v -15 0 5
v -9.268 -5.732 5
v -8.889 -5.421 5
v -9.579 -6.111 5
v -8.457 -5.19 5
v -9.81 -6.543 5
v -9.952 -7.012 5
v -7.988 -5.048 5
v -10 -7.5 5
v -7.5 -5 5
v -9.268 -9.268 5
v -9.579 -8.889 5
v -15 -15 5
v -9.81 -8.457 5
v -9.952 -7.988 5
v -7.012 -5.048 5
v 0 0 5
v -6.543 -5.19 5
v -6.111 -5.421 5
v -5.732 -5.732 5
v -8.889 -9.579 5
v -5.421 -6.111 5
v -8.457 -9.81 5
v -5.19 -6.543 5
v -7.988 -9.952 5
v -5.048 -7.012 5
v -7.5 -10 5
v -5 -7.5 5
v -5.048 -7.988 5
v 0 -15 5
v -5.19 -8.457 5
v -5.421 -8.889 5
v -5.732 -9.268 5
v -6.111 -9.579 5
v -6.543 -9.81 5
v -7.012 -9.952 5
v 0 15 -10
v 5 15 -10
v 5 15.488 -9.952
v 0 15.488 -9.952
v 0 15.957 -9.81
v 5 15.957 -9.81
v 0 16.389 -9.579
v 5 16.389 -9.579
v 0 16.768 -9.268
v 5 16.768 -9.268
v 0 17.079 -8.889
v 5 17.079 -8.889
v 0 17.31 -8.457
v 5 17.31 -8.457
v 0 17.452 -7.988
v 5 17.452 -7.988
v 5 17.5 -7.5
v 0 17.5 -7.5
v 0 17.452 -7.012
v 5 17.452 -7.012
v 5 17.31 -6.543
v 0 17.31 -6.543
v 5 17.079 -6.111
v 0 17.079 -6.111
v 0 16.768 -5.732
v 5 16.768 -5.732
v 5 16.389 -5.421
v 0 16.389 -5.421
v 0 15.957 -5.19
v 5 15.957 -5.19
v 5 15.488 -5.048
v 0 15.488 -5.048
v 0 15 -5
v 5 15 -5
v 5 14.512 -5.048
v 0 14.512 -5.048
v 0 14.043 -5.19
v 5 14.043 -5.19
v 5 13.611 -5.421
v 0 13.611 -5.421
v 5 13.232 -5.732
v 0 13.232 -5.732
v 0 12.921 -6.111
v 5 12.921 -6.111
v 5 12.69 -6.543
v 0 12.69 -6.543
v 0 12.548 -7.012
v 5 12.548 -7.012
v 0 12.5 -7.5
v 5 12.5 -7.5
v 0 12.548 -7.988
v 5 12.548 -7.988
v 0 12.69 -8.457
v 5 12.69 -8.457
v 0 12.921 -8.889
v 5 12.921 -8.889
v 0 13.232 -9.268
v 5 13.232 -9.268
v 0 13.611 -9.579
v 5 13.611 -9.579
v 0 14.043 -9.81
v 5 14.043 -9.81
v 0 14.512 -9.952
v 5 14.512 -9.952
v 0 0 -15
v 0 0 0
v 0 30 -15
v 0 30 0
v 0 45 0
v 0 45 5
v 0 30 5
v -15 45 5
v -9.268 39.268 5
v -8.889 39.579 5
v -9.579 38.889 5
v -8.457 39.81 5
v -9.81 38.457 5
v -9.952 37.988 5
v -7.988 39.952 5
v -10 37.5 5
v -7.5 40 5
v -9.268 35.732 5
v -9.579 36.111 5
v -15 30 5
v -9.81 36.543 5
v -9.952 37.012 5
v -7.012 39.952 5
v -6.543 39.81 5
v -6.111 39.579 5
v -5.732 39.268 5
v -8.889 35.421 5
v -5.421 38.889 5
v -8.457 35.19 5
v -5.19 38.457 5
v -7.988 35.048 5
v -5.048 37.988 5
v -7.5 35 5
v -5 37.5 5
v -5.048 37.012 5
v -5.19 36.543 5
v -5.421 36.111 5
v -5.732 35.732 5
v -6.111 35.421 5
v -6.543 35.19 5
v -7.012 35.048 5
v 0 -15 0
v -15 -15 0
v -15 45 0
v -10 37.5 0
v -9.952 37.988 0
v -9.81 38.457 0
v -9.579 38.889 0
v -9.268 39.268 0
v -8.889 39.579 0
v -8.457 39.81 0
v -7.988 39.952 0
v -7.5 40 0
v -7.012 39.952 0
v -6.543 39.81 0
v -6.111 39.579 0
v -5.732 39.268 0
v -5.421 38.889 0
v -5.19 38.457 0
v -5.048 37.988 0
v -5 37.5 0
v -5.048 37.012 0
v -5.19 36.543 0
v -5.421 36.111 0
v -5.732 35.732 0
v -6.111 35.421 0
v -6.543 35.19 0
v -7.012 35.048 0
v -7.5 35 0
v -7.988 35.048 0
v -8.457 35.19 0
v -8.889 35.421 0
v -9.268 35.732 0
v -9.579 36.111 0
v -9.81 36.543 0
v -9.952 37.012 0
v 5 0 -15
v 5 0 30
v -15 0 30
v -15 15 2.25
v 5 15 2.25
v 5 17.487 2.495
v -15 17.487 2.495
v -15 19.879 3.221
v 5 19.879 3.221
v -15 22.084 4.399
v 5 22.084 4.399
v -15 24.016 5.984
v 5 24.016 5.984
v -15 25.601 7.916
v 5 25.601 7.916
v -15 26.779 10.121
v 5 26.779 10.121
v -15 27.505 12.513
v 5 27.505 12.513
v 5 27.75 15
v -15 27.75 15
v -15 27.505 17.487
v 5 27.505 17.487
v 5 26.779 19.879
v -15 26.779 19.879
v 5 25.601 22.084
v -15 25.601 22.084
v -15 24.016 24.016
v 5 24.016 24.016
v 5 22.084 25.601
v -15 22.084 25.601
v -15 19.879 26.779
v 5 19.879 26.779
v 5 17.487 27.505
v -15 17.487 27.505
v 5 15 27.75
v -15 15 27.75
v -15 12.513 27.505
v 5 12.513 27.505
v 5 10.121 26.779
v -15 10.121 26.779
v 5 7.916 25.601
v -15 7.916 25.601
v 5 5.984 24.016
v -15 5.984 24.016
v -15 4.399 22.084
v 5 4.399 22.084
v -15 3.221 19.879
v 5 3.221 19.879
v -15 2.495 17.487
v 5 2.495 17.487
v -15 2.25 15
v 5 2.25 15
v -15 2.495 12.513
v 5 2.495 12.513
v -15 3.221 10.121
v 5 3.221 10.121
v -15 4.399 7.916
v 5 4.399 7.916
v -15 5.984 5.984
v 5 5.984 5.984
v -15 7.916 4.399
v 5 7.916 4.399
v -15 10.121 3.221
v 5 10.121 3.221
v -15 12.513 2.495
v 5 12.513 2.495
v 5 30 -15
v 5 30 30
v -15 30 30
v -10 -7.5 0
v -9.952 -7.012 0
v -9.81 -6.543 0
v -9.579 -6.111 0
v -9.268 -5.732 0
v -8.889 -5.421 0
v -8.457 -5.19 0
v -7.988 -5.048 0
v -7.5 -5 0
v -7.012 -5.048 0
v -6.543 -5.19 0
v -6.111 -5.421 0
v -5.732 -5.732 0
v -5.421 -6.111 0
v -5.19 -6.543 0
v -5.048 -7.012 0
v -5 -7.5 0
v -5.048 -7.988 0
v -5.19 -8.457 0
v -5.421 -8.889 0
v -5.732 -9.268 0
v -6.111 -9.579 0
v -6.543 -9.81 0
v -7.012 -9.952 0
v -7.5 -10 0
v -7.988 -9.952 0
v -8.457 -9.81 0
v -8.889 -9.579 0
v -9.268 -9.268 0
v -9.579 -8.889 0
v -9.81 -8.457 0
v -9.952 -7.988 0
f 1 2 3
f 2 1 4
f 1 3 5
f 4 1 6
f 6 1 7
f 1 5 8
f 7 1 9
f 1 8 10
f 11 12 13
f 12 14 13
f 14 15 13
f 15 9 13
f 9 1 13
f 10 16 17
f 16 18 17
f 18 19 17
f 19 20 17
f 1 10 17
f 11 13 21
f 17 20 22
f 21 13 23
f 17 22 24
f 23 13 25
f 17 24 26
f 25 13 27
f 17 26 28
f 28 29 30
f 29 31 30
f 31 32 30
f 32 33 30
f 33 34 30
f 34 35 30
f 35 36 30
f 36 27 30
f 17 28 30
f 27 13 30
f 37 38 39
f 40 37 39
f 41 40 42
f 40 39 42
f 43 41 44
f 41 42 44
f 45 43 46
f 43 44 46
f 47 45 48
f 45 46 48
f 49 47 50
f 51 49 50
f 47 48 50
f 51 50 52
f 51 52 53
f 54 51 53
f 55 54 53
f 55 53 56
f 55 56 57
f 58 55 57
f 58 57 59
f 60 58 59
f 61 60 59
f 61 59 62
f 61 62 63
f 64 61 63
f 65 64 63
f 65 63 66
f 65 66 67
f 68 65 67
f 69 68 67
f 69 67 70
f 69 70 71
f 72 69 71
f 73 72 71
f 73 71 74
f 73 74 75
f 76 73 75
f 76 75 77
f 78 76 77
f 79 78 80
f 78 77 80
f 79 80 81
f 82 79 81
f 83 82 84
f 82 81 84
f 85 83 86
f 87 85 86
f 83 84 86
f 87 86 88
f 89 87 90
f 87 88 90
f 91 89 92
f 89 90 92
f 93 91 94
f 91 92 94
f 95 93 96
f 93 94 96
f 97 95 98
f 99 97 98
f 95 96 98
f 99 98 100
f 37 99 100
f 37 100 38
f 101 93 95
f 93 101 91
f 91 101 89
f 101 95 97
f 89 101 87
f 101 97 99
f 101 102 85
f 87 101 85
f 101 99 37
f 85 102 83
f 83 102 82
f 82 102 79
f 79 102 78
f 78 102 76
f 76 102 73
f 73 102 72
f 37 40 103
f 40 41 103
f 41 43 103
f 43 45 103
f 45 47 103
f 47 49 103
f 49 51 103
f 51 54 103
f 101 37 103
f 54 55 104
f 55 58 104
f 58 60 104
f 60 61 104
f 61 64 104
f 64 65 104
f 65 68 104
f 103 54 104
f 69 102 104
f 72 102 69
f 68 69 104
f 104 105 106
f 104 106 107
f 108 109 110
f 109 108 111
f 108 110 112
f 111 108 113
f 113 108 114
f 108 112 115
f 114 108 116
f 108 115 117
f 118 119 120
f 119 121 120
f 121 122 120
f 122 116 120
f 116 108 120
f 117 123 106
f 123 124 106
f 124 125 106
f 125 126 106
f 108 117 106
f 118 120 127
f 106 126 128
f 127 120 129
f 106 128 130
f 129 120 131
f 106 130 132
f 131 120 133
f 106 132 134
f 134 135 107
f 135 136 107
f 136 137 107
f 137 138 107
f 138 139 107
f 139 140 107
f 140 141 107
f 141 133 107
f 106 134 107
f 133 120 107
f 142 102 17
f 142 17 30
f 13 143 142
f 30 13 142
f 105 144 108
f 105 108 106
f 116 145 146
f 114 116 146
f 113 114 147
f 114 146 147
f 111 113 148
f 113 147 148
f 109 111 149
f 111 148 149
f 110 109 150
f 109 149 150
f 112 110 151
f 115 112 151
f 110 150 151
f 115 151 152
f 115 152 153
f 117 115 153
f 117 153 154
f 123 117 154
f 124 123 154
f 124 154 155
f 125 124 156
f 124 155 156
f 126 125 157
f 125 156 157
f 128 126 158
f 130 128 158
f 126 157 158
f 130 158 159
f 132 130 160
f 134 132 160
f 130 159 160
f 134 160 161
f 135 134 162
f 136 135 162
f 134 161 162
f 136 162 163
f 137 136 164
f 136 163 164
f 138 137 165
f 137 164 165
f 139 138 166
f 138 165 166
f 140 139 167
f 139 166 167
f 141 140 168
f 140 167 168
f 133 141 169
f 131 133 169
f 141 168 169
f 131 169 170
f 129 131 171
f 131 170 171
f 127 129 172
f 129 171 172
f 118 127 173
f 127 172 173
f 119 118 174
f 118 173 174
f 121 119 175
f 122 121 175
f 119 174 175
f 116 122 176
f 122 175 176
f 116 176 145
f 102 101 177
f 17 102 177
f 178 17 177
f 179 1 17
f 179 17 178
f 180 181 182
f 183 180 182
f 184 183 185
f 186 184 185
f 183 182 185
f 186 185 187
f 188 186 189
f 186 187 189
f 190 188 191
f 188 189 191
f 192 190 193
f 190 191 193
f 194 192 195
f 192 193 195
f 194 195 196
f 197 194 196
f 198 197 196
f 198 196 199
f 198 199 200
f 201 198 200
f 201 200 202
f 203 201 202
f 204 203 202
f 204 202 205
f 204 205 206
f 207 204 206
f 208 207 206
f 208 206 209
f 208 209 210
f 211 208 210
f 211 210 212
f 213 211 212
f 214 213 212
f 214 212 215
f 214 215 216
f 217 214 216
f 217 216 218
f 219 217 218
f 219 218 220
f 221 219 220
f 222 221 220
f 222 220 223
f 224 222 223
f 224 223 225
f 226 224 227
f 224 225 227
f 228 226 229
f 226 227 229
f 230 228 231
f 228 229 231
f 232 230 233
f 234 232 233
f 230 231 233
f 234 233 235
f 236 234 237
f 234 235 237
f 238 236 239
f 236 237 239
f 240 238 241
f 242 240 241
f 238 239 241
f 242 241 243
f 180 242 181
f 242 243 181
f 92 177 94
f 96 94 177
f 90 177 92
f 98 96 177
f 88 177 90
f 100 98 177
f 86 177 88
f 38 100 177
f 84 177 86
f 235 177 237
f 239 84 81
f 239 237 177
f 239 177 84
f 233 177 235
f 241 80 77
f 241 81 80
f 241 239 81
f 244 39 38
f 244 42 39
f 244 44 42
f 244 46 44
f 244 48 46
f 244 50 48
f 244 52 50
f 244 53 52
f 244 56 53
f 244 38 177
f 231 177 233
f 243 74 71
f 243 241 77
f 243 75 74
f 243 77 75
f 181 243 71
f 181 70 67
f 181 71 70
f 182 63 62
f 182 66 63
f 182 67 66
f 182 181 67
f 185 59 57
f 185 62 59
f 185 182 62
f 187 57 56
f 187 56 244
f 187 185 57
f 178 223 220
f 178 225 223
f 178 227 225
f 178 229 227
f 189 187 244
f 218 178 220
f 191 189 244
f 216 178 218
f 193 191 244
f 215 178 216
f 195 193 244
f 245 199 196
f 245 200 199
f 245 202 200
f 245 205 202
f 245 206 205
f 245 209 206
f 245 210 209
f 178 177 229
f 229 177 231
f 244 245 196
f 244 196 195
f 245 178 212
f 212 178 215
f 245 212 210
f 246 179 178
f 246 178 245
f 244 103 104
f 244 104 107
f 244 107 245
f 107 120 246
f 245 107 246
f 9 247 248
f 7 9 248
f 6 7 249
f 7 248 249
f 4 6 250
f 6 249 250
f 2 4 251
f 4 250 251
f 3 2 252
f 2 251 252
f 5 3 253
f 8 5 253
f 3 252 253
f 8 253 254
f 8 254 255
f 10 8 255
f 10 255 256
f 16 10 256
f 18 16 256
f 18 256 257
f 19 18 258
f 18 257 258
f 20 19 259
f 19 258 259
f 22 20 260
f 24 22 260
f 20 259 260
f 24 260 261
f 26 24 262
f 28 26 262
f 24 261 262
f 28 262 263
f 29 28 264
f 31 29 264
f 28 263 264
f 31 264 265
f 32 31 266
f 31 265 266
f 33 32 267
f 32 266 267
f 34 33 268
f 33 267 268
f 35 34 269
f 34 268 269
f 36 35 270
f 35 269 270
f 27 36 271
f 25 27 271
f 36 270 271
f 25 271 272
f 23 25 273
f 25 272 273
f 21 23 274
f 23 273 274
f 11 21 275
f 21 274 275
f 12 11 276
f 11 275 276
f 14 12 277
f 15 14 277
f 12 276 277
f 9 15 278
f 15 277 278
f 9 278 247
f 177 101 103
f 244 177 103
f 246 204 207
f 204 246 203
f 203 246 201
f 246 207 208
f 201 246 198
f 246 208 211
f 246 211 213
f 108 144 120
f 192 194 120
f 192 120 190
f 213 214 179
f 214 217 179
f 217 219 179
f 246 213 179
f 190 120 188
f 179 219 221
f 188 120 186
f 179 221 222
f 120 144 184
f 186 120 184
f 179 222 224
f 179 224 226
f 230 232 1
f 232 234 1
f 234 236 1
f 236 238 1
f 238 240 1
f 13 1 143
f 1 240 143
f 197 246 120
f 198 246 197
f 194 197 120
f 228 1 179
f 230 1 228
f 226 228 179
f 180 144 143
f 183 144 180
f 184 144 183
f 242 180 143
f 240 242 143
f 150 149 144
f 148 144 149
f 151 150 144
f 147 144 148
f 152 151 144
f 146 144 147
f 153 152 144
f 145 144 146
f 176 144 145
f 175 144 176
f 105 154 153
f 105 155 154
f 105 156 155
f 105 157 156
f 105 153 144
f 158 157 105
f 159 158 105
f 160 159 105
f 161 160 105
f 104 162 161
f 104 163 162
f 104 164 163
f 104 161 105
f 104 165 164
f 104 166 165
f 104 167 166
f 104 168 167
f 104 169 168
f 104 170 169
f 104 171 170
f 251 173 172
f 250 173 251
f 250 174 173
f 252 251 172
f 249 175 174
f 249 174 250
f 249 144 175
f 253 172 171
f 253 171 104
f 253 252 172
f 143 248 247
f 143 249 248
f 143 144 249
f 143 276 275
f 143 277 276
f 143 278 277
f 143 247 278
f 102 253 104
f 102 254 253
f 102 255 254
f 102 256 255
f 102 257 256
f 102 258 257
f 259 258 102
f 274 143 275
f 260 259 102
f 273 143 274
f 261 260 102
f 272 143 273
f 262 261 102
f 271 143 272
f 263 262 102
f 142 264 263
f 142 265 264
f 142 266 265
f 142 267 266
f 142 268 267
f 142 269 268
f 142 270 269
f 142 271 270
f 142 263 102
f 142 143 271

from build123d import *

# Parameters (mm, degrees)
SKETCH1_W           = 30
SKETCH1_H           = 15
BOSS_EXTRUDE1_DEPTH = 30
SKETCH2_W           = 30
SKETCH2_H           = 45
BOSS_EXTRUDE2_DEPTH = 5
SKETCH5_R           = 2.5
CUT_EXTRUDE2_DEPTH  = 47.904157598
SKETCH3_R           = 12.75
CUT_EXTRUDE3_DEPTH  = 47.904157598
SKETCH8_W           = 15
SKETCH8_H           = 15
SKETCH8_R           = 2.5
BOSS_EXTRUDE4_DEPTH = 5


with BuildPart() as part:
    # Sketch1 → Boss-Extrude1 (new body)
    with BuildSketch(Plane(origin=(0, 0, 0), x_dir=(0, 1, 0), z_dir=(0, 0, 1))):
        with Locations((15, 7.5)):
            Rectangle(SKETCH1_W, SKETCH1_H)
    extrude(amount=BOSS_EXTRUDE1_DEPTH)

    # Sketch2 → Boss-Extrude2 (add)
    with BuildSketch(Plane.YZ):
        with Locations((15, 7.5)):
            Rectangle(SKETCH2_W, SKETCH2_H)
    extrude(amount=BOSS_EXTRUDE2_DEPTH)

    # Sketch5 → Cut-Extrude2 (cut, through all)
    with BuildSketch(Plane.YZ.offset(5)):
        with Locations(Location((15, -7.5, 0), (0, 0, 270))):
            Circle(SKETCH5_R)
    extrude(amount=-CUT_EXTRUDE2_DEPTH, mode=Mode.SUBTRACT)

    # Sketch3 → Cut-Extrude3 (cut, through all)
    with BuildSketch(Plane.YZ.offset(5)):
        with Locations(Location((15, 15, 0), (0, 0, 270))):
            Circle(SKETCH3_R)
    extrude(amount=-CUT_EXTRUDE3_DEPTH, mode=Mode.SUBTRACT)

    # Sketch8 → Boss-Extrude4 (add)
    # profile 1 of 2: a face of its own
    with BuildSketch(Plane(origin=(0, 0, 0), x_dir=(1, 0, 0), z_dir=(0, 0, -1))):
        with Locations((-7.5, -37.5)):
            Rectangle(SKETCH8_W, SKETCH8_H)
        with Locations(Location((-7.5, -37.5, 0), (0, 0, 180))):
            Circle(SKETCH8_R, mode=Mode.SUBTRACT)
    # profile 2 of 2: a face of its own
    with BuildSketch(Plane(origin=(0, 0, 0), x_dir=(1, 0, 0), z_dir=(0, 0, -1))):
        with Locations((-7.5, 7.5)):
            Rectangle(SKETCH8_W, SKETCH8_H)
        with Locations(Location((-7.5, 7.5, 0), (0, 0, 180))):
            Circle(SKETCH8_R, mode=Mode.SUBTRACT)
    extrude(amount=-BOSS_EXTRUDE4_DEPTH)


solid = part.part
